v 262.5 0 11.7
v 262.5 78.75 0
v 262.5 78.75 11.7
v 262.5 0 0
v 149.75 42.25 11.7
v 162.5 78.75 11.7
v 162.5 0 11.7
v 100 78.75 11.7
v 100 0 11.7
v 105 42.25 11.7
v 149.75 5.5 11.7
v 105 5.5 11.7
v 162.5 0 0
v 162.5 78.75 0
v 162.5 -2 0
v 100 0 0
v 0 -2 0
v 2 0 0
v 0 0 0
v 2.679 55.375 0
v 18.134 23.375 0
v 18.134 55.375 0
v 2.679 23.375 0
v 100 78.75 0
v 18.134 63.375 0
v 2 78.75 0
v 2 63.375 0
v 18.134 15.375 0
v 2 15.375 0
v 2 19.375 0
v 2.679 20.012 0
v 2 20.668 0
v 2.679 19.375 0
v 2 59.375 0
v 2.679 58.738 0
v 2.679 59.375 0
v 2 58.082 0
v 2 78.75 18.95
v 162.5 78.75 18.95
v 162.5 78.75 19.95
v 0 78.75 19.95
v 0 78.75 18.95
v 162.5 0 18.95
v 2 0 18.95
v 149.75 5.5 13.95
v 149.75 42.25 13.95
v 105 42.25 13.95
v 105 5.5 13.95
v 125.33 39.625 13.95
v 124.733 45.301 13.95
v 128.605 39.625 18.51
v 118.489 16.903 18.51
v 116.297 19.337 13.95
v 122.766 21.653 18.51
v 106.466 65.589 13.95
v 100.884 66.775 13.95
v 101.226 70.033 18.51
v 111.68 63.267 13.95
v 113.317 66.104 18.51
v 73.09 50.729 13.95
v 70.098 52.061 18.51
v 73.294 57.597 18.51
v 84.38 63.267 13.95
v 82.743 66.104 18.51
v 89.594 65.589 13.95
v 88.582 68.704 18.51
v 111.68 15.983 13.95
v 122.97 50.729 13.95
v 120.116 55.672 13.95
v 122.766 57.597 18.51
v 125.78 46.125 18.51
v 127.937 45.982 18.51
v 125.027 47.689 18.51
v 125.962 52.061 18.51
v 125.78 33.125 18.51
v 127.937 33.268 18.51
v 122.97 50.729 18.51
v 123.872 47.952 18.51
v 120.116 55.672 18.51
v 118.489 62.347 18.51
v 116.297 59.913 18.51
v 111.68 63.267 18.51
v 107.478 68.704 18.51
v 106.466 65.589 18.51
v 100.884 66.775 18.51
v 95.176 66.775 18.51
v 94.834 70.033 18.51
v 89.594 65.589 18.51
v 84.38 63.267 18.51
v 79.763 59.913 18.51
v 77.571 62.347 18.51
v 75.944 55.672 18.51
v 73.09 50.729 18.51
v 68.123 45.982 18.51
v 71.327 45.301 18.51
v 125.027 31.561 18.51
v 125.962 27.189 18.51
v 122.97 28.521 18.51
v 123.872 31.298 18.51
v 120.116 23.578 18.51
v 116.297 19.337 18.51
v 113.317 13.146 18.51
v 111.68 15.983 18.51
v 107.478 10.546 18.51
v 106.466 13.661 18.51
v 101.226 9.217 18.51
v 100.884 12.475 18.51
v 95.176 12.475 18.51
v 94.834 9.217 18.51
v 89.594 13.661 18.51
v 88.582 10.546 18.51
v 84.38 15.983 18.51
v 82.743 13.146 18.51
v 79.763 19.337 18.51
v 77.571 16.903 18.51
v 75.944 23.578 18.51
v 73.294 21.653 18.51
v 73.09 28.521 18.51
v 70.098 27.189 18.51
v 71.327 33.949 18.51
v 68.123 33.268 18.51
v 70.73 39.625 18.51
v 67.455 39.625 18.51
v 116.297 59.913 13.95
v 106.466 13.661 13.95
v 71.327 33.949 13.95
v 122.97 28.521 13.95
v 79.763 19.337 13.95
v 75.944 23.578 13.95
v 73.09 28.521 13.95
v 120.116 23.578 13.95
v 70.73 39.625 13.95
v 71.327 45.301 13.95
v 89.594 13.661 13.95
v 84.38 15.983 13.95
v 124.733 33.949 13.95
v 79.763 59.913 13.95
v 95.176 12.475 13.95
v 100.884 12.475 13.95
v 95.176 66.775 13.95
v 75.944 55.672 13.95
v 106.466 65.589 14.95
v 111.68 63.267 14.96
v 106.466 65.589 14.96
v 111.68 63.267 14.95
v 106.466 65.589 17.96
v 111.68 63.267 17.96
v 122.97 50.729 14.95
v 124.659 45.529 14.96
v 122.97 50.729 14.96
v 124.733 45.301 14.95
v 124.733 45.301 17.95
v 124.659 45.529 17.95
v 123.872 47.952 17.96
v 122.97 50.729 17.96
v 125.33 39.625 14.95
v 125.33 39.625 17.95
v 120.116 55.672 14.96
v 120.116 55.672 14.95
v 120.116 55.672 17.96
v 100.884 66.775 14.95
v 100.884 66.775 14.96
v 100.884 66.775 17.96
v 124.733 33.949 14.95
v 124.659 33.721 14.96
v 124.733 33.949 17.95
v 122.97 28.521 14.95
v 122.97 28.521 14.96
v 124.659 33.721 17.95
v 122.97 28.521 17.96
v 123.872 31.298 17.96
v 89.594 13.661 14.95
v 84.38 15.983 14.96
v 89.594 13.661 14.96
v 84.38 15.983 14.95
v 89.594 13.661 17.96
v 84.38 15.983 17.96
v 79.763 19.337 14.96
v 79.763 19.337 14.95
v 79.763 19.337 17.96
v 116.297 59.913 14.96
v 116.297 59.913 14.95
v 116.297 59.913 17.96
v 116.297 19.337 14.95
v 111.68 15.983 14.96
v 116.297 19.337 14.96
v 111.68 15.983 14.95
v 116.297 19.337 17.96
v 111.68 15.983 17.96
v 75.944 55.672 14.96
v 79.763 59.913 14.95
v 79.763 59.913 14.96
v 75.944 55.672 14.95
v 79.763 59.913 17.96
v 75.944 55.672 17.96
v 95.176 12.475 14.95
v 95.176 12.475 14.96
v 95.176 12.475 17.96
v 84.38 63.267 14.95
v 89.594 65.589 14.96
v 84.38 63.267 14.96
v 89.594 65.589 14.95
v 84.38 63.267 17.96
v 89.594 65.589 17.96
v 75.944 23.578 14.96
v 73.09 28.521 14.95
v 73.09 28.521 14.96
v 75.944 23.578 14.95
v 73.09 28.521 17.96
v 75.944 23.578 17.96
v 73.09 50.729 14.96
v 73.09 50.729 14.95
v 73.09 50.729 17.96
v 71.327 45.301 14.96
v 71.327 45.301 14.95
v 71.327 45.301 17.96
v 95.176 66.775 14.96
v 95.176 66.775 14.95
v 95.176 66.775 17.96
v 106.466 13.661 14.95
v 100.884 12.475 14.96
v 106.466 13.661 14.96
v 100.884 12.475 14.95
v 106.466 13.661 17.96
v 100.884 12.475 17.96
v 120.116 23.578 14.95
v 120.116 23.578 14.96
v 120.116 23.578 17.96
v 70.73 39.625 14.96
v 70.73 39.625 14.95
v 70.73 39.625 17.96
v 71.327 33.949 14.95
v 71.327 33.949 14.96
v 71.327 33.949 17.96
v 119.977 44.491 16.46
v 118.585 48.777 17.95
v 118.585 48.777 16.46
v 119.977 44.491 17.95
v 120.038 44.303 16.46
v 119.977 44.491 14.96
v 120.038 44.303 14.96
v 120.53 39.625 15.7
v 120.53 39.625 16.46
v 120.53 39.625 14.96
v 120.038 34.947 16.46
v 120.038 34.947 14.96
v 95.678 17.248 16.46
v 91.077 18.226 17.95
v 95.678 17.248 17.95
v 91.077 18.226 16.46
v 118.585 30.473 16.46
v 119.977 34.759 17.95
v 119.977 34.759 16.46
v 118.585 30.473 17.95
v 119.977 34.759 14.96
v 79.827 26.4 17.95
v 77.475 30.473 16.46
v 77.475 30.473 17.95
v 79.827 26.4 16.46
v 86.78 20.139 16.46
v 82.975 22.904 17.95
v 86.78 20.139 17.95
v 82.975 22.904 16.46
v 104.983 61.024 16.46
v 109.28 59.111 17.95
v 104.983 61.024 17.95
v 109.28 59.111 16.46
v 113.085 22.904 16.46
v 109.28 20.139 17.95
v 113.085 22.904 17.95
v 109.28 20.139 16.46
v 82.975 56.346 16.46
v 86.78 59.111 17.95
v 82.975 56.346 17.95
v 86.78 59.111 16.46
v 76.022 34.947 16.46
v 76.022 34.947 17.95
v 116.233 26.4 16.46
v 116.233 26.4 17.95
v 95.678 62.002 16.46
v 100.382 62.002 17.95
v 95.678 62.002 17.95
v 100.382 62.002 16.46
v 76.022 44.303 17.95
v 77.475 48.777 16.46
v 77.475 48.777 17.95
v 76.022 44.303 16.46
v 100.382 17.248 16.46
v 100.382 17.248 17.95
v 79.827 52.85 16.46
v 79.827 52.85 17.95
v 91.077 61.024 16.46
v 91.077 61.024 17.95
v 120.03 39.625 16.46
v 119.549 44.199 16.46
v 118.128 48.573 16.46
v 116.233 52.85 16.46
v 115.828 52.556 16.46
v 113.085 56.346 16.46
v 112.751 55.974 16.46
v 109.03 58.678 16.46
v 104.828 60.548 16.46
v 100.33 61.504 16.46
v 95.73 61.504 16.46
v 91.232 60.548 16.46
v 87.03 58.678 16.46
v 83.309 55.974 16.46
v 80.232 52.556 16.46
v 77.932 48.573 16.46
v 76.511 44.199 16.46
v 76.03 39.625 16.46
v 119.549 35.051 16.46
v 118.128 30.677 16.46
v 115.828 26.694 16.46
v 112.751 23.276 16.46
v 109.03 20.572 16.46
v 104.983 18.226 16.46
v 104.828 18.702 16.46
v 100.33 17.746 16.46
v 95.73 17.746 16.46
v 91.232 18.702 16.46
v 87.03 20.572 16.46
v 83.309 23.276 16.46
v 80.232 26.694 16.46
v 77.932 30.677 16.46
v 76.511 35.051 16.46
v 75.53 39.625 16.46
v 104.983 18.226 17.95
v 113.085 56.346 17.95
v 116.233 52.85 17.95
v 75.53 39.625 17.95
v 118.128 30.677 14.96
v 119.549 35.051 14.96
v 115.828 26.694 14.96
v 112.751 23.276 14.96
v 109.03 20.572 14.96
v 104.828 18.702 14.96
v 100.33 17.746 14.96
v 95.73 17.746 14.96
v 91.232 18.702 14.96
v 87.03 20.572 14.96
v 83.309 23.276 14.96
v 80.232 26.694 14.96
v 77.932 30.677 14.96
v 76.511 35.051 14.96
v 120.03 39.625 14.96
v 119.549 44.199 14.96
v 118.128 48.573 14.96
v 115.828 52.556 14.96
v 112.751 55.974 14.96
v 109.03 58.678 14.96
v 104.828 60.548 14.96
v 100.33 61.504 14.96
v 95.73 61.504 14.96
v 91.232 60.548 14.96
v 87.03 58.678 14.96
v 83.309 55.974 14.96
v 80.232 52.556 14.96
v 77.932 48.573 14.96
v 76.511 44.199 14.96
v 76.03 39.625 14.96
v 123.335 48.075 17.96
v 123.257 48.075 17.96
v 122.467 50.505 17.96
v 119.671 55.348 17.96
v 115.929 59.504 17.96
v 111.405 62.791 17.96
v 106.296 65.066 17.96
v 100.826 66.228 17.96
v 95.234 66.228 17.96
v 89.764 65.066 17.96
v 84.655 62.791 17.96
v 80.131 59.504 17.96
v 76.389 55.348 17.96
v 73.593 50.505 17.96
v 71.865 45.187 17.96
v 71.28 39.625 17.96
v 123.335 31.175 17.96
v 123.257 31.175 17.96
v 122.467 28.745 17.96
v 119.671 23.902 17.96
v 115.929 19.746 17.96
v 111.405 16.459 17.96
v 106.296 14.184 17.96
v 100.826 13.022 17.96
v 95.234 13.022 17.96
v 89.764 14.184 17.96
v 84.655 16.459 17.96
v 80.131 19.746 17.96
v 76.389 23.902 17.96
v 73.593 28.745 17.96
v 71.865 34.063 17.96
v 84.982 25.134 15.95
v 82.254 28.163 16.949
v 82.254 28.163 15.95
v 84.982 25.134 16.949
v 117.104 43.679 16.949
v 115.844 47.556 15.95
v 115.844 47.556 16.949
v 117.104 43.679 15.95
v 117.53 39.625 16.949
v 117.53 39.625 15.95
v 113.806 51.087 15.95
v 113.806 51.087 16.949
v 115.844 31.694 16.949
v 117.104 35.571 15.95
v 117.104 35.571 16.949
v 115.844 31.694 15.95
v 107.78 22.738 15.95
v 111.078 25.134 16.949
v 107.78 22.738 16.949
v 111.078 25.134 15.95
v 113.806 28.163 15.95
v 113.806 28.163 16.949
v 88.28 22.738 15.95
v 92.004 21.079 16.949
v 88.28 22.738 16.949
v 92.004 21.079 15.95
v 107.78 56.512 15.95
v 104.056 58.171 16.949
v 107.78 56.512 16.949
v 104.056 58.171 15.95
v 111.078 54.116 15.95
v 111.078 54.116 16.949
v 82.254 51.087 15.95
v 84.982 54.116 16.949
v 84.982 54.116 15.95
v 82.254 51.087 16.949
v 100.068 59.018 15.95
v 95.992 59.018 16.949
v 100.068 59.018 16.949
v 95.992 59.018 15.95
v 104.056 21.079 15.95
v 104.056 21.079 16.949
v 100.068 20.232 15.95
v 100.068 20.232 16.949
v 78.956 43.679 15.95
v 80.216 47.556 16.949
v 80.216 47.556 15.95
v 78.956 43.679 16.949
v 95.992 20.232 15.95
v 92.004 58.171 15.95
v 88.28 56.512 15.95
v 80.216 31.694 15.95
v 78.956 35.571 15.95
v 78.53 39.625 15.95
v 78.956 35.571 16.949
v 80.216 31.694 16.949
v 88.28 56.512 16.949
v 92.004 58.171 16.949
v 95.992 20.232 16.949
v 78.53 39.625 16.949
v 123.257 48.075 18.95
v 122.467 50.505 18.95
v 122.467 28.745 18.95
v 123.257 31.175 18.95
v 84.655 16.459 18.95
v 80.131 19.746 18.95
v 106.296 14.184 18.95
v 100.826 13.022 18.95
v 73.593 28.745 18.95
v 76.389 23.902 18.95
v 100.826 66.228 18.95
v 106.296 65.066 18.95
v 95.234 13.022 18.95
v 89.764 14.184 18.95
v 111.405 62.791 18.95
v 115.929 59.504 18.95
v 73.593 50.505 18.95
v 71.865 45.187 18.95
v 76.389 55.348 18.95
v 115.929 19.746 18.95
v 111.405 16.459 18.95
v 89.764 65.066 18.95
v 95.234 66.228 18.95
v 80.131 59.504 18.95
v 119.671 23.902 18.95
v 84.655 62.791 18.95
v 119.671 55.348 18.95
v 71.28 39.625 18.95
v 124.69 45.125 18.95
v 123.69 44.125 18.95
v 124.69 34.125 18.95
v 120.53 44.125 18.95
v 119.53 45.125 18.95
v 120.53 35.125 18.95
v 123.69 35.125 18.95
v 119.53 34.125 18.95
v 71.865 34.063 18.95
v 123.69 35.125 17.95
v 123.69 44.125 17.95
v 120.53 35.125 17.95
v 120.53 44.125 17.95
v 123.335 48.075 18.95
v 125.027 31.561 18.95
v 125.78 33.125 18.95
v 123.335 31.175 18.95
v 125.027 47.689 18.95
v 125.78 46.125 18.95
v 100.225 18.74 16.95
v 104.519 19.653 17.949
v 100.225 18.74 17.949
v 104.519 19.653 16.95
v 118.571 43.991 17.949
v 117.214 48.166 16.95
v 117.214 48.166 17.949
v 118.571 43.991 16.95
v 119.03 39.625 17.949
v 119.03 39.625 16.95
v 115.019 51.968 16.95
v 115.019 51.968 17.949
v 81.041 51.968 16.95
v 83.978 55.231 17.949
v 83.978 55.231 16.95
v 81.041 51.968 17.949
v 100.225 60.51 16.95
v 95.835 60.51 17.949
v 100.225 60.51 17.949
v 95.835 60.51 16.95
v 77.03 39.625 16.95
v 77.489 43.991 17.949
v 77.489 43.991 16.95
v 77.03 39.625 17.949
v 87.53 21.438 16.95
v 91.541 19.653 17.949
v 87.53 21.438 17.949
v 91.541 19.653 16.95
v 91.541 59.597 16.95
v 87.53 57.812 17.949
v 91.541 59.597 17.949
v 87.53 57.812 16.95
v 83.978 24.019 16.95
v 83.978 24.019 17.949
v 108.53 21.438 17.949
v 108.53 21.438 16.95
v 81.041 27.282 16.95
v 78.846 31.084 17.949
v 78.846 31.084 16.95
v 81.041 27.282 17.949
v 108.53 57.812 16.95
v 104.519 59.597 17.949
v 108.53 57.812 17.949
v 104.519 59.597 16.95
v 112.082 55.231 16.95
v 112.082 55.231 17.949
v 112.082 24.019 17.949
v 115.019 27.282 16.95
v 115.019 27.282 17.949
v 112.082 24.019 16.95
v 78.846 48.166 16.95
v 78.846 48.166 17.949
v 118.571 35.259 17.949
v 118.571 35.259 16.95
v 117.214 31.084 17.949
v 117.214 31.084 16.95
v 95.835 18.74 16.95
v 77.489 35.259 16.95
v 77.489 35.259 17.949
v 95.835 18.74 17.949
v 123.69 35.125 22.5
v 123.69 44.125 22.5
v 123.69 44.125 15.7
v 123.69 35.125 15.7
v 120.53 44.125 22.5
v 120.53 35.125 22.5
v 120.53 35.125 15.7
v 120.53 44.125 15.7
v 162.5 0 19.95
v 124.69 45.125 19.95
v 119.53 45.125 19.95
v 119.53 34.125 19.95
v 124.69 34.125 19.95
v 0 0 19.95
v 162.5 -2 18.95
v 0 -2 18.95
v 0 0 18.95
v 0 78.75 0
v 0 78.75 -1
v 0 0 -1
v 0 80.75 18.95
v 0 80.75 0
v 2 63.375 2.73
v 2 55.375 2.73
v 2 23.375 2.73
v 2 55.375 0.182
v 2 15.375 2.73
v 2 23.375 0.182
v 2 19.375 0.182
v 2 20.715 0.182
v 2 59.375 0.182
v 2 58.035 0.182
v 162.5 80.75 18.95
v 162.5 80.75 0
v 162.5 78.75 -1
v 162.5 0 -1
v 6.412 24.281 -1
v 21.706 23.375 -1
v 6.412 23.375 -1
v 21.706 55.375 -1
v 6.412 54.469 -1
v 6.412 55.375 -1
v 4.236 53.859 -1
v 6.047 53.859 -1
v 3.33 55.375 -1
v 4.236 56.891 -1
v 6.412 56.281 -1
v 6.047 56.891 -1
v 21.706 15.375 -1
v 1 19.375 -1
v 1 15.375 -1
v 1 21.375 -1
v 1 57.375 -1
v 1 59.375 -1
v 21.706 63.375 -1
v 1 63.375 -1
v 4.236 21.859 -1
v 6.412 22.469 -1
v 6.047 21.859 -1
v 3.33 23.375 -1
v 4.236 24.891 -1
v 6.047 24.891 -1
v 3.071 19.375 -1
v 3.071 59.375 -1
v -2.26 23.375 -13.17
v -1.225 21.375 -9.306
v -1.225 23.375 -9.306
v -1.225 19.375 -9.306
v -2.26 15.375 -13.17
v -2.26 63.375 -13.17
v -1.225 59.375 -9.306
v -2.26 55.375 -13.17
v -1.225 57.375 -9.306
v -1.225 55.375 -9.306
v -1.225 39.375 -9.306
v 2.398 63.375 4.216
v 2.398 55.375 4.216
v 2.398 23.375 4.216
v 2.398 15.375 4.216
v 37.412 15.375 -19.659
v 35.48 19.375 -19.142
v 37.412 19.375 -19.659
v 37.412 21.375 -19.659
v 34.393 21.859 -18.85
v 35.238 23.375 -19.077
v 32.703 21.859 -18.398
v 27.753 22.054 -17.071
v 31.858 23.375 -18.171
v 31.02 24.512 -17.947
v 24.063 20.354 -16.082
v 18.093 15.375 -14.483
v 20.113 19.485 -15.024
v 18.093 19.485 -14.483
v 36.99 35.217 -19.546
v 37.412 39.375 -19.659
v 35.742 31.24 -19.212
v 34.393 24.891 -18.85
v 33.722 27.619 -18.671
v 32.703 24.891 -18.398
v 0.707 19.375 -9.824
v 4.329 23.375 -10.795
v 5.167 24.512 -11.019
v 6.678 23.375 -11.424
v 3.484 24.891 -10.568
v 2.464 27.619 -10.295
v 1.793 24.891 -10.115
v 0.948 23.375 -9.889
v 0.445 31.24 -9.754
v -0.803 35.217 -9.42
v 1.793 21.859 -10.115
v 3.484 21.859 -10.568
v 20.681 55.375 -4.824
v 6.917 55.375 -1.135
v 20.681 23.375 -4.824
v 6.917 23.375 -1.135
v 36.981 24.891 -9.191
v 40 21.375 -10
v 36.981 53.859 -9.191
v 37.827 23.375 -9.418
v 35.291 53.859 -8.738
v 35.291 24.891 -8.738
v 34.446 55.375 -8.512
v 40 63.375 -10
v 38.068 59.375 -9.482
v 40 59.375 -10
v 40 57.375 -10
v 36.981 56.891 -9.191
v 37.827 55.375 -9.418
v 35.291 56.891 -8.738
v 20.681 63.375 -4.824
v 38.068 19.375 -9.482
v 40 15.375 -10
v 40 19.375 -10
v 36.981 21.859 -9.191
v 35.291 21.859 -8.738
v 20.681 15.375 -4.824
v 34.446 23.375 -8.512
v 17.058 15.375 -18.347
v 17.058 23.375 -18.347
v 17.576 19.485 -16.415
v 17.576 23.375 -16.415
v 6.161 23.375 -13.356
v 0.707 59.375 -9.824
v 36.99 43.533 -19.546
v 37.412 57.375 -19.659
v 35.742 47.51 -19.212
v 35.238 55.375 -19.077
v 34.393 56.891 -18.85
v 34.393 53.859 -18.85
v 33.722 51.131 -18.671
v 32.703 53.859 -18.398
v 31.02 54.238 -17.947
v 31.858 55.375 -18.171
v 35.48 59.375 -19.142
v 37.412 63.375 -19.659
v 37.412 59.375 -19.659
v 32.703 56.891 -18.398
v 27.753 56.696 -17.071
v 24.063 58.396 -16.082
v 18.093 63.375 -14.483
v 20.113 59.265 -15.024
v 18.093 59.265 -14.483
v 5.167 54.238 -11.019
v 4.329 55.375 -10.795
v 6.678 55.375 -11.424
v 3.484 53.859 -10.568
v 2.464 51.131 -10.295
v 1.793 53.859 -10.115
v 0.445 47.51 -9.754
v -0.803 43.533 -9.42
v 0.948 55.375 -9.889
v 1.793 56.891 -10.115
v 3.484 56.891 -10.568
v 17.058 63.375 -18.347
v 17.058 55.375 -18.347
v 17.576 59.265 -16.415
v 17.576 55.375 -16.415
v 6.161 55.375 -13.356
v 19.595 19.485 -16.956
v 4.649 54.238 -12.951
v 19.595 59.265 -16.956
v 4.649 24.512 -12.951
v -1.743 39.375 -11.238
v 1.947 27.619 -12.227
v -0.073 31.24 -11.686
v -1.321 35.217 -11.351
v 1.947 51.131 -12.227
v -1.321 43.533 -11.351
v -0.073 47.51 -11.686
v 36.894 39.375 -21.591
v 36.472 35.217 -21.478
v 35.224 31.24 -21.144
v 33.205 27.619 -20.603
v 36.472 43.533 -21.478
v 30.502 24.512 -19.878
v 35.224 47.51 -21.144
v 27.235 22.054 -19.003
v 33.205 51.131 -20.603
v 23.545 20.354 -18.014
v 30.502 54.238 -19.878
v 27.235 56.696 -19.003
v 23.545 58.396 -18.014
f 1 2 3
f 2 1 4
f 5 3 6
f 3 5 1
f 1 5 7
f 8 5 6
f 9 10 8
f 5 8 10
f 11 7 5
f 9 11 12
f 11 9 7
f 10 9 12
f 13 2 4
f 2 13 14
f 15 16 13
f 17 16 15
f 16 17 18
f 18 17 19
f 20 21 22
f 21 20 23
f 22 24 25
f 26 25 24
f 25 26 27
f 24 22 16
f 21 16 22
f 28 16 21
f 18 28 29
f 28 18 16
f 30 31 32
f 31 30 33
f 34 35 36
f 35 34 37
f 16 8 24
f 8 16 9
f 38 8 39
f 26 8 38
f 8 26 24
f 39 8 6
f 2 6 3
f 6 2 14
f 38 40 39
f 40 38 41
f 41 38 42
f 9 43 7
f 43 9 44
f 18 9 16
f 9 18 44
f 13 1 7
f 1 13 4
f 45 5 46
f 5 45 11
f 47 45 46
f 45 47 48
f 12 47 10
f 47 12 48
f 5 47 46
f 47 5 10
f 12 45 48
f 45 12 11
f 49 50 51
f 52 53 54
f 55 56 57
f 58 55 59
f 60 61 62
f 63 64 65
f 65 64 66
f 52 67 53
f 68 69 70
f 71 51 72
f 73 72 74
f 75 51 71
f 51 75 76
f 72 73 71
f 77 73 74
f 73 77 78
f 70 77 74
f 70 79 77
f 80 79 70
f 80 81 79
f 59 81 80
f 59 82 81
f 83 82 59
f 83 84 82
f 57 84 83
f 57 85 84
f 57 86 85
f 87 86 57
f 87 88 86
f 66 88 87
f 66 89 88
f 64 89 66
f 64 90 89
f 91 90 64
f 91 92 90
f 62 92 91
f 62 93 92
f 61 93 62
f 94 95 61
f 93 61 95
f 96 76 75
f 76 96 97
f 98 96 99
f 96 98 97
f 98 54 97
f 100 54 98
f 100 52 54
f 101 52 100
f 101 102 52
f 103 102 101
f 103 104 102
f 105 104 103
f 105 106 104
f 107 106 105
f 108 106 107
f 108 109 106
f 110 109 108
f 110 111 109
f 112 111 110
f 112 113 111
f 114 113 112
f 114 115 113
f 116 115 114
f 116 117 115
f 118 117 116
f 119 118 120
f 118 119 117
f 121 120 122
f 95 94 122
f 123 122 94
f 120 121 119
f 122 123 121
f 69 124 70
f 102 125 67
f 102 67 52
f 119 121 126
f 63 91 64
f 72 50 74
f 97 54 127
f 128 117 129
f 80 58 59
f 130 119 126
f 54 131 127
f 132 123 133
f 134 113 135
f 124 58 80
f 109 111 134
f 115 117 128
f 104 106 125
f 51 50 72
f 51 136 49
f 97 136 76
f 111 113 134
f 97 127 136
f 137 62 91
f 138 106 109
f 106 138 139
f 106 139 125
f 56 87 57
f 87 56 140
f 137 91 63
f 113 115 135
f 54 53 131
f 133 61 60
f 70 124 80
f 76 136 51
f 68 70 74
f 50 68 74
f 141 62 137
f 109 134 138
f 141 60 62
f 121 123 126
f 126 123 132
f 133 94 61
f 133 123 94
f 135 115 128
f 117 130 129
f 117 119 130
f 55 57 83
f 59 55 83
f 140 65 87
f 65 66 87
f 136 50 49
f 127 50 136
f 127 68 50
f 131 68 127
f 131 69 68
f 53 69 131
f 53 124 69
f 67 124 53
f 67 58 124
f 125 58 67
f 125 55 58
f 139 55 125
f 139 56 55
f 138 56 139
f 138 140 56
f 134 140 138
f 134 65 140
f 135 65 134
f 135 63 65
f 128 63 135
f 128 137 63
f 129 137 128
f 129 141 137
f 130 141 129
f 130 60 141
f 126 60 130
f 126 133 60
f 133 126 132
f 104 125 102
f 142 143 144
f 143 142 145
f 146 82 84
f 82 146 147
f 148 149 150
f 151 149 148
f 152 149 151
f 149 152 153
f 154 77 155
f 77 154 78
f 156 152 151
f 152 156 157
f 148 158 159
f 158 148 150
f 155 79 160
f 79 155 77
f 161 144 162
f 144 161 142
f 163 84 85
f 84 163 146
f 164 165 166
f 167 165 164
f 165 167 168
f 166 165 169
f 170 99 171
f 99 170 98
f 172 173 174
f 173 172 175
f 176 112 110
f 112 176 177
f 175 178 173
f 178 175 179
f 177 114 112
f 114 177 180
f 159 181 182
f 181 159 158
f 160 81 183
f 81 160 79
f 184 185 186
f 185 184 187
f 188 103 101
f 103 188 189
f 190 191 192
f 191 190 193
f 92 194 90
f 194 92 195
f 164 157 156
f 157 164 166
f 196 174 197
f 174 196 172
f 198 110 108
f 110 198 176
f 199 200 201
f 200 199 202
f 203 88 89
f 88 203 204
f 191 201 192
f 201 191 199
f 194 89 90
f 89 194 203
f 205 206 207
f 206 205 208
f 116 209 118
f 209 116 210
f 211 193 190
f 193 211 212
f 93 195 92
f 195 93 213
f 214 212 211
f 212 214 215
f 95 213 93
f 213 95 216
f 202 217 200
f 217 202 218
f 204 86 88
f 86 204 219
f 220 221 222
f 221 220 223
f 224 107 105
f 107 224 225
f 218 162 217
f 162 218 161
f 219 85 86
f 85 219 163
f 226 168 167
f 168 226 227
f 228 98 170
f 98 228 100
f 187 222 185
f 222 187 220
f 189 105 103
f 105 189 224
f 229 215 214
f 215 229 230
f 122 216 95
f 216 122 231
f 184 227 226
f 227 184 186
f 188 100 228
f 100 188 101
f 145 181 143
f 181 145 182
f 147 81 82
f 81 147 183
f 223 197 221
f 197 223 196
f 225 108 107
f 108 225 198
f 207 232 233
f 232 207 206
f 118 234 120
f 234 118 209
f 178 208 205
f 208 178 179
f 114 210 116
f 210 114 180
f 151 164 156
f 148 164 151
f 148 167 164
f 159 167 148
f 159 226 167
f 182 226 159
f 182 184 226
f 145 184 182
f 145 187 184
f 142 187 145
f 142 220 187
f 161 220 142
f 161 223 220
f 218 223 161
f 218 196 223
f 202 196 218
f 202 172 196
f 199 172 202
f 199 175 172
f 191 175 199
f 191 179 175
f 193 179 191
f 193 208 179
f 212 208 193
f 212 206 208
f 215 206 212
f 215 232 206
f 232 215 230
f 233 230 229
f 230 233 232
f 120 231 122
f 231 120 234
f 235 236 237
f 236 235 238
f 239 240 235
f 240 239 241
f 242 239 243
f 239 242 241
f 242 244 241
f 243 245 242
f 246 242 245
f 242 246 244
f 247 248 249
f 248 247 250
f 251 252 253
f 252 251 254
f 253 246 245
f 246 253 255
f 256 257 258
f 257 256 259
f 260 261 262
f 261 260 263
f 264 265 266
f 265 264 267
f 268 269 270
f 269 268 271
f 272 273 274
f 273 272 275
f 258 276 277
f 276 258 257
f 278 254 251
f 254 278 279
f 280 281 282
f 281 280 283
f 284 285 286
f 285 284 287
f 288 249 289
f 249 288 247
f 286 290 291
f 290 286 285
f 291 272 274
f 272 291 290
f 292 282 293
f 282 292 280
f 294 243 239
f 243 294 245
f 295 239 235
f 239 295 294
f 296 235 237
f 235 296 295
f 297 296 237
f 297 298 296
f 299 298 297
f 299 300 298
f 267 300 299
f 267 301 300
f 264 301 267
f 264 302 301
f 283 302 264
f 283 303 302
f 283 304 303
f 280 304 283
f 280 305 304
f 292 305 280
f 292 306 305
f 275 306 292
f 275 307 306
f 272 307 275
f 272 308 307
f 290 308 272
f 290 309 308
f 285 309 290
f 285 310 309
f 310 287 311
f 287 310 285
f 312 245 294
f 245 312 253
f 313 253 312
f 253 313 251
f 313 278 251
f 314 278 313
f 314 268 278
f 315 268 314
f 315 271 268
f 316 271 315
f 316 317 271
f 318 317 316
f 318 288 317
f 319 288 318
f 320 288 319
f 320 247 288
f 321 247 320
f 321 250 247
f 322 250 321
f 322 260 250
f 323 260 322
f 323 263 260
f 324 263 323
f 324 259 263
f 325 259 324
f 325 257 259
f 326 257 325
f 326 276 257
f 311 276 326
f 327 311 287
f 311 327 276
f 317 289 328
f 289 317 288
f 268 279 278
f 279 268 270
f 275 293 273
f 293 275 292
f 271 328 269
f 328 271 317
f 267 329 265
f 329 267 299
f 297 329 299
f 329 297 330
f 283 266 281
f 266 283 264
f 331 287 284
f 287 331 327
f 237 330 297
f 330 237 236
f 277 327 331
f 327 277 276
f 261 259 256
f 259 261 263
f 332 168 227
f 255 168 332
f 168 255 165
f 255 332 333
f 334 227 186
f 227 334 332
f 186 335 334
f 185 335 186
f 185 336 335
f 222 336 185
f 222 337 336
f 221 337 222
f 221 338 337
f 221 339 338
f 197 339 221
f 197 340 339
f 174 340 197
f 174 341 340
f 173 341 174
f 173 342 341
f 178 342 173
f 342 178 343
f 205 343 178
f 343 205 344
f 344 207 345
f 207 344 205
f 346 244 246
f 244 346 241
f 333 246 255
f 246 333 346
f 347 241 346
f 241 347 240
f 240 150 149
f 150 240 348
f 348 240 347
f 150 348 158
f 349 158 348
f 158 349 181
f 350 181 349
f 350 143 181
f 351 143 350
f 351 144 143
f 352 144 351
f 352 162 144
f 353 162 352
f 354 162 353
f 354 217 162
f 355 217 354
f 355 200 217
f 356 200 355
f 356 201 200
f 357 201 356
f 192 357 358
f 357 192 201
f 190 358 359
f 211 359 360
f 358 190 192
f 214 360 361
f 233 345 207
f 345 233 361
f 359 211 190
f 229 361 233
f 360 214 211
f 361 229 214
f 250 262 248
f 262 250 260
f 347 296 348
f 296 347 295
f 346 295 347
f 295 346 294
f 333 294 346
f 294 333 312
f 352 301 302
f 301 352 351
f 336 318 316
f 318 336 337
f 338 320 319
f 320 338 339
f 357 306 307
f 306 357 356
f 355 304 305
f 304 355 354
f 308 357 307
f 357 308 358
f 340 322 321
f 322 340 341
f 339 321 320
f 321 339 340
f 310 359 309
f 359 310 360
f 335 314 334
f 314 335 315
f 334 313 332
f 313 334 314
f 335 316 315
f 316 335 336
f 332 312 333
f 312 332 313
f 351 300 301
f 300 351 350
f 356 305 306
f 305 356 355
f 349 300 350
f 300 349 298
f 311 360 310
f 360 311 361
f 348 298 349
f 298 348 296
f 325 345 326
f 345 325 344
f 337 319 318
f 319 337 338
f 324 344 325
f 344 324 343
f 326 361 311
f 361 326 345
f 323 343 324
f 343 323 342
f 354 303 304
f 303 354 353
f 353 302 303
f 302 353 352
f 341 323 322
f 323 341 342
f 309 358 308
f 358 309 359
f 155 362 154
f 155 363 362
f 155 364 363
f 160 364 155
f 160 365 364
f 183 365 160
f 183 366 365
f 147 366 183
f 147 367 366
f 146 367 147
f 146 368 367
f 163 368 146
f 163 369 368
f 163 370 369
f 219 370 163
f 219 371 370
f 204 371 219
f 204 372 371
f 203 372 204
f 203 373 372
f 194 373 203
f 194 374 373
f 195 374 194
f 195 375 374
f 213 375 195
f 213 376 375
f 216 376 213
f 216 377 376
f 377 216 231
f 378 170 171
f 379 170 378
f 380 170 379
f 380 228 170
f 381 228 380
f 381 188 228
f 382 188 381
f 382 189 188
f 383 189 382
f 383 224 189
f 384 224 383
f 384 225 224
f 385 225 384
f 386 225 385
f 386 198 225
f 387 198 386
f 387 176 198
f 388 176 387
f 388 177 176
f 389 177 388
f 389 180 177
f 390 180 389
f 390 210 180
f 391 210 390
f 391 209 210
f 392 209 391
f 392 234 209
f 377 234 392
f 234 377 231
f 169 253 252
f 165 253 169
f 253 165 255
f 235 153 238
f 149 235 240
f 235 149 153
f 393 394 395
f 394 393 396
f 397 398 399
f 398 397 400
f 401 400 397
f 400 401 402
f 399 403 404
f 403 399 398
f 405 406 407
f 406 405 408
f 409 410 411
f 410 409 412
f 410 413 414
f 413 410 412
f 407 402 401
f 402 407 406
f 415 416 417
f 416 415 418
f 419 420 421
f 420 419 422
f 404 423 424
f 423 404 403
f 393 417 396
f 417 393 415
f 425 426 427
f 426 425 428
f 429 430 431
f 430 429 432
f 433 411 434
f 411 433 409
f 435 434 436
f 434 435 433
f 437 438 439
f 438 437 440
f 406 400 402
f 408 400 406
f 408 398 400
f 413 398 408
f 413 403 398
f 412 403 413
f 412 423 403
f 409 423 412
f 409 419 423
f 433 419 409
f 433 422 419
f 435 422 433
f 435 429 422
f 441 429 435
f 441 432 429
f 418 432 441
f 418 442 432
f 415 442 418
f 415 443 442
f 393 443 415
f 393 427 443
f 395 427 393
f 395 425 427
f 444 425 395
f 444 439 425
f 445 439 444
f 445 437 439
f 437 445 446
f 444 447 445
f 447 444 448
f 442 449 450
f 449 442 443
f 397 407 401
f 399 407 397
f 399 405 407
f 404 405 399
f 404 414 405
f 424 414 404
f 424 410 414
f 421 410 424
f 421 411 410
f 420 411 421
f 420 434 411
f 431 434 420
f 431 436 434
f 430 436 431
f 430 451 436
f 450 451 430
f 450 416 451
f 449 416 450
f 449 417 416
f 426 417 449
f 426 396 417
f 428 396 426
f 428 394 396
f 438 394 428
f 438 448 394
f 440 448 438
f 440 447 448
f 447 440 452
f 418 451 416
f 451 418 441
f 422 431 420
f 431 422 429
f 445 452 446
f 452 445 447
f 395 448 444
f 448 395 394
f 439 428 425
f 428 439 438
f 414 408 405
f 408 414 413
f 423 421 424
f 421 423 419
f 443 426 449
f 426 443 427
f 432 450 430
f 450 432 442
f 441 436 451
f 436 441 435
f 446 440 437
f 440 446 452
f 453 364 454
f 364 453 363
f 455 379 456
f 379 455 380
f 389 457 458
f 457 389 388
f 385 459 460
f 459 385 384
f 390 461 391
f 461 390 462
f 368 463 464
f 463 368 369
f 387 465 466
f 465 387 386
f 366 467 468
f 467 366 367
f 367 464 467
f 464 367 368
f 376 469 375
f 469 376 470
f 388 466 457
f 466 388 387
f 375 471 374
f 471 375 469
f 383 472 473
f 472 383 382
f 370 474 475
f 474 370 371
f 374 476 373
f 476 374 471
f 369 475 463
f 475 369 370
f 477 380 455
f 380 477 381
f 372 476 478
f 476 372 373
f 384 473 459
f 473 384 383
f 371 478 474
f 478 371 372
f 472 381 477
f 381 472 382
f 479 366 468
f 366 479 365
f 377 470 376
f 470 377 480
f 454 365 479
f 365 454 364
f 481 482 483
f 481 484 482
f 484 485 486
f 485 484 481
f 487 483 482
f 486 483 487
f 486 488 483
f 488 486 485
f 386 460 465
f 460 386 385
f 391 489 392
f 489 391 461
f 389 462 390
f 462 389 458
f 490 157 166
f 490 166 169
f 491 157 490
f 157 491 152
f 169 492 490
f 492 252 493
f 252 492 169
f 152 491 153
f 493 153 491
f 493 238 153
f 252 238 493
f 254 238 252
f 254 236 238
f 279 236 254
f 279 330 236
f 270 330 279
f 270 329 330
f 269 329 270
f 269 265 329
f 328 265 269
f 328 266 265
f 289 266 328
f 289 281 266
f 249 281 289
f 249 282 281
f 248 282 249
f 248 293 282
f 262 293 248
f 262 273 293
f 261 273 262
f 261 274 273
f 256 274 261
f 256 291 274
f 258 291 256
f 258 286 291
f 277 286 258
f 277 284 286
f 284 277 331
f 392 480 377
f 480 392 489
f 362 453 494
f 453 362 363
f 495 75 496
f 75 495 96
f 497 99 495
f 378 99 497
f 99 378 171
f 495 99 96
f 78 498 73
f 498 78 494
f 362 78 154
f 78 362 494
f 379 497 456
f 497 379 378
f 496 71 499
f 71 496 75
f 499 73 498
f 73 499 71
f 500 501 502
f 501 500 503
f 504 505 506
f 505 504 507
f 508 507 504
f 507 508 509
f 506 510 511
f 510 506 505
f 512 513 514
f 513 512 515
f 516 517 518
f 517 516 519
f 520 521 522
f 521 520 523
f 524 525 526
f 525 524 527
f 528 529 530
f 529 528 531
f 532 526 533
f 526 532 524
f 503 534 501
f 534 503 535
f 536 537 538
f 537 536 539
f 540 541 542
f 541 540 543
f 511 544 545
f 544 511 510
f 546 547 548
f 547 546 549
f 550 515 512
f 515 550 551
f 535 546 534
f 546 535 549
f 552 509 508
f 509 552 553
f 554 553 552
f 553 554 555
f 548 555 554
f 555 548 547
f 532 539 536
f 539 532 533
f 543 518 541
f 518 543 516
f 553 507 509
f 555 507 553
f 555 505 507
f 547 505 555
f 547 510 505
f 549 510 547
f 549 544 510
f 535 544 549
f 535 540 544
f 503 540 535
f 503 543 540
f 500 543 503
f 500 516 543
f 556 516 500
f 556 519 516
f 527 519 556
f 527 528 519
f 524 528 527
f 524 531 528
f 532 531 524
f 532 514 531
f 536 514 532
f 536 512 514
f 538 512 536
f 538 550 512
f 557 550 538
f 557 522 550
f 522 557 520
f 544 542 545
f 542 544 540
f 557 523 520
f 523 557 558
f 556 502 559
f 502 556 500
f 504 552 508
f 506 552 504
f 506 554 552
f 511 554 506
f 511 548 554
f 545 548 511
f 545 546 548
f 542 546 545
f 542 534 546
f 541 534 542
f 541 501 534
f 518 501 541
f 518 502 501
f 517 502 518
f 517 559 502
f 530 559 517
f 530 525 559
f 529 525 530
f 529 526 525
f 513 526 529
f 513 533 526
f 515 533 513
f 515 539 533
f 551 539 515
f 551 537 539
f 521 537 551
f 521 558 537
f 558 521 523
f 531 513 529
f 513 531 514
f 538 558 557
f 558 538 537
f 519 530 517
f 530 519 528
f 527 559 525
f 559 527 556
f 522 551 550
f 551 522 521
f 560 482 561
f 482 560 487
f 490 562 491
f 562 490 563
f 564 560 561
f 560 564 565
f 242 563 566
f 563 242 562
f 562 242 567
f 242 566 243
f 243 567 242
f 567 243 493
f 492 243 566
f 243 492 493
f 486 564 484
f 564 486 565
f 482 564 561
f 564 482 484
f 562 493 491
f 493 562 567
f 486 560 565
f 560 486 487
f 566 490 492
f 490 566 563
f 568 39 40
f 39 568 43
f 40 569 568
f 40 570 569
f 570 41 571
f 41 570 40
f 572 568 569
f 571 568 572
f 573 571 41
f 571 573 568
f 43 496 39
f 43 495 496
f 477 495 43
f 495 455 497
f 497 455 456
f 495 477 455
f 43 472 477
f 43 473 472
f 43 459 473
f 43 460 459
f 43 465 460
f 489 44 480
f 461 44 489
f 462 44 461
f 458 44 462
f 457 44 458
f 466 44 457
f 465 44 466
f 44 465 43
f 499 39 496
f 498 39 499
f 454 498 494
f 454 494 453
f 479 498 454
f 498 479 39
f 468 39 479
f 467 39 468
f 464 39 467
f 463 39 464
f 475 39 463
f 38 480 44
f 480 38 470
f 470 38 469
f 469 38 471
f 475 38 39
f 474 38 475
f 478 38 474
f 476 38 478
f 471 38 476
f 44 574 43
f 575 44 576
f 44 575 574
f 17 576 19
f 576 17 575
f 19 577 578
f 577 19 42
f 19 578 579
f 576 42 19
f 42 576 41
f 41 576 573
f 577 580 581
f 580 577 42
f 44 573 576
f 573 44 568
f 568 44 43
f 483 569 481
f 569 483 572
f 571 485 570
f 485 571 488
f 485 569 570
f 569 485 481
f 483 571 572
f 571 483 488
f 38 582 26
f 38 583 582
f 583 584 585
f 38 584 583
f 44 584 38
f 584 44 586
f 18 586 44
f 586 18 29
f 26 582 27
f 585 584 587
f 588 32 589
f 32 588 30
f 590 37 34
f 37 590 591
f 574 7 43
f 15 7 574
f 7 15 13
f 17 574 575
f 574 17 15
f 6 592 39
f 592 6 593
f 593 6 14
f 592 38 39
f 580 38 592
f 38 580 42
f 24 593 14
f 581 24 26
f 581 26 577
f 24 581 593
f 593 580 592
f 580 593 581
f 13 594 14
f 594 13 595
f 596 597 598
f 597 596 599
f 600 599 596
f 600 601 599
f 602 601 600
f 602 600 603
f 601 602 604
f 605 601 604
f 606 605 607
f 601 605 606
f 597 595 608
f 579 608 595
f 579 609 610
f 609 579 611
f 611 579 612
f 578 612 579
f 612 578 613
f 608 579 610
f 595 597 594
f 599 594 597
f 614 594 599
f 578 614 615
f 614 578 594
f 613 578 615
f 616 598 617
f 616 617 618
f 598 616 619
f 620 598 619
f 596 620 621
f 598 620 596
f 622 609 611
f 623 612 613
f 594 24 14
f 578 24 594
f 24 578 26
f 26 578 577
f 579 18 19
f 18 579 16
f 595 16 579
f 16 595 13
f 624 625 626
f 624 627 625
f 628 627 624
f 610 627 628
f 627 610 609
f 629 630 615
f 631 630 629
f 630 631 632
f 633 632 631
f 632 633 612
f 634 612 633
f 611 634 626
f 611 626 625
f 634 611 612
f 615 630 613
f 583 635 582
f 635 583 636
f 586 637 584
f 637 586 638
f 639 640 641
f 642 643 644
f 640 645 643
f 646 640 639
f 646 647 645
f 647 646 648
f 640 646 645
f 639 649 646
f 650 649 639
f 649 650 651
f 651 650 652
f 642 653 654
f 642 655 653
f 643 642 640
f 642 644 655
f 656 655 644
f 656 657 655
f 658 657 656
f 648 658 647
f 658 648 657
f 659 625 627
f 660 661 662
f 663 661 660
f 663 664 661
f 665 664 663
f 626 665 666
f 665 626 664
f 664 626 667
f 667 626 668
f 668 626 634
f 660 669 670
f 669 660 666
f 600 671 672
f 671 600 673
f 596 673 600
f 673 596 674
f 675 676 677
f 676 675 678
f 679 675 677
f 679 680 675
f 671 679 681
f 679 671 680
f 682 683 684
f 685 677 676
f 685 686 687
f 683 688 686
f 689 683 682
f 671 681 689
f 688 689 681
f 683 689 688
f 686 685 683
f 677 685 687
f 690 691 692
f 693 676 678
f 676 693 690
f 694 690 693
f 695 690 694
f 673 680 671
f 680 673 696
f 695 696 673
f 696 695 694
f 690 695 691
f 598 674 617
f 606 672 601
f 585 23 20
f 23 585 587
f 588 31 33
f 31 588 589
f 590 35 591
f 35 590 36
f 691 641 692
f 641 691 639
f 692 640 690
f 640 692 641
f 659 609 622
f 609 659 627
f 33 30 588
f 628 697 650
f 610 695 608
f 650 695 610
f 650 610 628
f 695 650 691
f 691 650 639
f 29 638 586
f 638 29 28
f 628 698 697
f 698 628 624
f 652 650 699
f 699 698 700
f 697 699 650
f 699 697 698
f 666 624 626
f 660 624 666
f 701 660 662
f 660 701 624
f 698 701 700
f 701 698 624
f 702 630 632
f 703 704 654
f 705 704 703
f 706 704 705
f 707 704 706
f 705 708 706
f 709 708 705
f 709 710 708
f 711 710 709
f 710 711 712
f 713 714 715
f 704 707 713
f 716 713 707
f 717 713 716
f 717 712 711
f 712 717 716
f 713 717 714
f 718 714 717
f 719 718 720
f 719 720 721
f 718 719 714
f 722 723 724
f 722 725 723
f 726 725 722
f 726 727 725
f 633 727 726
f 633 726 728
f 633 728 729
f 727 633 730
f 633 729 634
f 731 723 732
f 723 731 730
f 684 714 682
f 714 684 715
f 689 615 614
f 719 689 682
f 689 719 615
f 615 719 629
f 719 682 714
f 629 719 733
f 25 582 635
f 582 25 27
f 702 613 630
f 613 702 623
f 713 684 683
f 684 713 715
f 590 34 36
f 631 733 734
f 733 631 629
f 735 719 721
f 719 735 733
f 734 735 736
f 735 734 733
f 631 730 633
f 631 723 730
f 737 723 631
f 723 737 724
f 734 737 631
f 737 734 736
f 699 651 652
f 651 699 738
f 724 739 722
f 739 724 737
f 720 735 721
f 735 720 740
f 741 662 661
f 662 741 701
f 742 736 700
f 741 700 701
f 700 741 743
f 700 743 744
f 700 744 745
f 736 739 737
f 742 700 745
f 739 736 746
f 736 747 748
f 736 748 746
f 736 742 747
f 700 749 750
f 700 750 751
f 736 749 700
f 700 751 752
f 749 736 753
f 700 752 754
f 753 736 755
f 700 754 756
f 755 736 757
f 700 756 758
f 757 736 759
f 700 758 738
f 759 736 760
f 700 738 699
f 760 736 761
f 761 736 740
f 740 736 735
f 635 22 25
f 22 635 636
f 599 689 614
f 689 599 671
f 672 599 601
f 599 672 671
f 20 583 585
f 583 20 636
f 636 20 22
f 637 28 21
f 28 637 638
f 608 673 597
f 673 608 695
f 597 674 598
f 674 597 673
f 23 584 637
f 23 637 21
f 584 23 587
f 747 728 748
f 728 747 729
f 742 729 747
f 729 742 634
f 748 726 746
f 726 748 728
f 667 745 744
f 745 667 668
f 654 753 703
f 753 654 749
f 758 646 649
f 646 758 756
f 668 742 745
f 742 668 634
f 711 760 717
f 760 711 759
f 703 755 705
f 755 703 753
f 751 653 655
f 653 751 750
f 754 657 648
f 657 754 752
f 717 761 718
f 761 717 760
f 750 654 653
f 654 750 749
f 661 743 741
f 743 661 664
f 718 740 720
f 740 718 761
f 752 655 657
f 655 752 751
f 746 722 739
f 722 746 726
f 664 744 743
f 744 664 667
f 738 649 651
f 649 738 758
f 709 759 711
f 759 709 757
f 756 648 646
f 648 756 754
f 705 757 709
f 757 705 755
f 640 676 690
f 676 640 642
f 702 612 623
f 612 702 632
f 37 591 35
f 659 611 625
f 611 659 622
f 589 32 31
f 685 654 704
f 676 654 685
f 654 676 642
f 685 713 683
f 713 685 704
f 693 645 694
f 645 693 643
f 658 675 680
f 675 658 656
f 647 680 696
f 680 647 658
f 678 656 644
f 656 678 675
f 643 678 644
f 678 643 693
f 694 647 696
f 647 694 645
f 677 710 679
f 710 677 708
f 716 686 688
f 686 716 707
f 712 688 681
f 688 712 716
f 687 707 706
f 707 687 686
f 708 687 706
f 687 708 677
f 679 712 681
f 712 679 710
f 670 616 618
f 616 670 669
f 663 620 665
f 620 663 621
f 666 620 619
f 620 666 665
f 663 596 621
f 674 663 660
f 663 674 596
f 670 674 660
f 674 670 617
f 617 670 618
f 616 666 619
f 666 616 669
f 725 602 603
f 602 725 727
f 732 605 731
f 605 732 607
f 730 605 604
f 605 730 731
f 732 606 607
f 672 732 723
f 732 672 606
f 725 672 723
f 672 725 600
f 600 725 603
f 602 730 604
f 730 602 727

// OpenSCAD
caselength=162.5;
module HMD() { // phone with case. rough model for visualization
    color("#666666") cube([caselength, 78.75, 11.7]);
    color("#444444") translate([5, 5.5, 11.7]) cube([44.75,36.75,2.25]);
}

module chargerHolder(ring=true) {
    d2=61.15;
    d1=54.6;
    sideOffset = (9.3+8.8)/2; // snap position avg
    bottomOffset = (34.65+33.14)/2; // snap position avg
    translate([caselength-bottomOffset-d2/2, sideOffset+d2/2, 11.7+2.25]) {
//        cylinder(d2=d2, d1=54.6, h=4.56);
//        cylinder(d=54, h=1);
        difference() {
            cylinder(d2=d2, d1=d1, h=4.56);
            translate([0,0,1]) cylinder(d=d1, h=4.56);
        }
        translate([0,0,1.01]) difference() { // 1.5mm inner ring
            cylinder(h=1.5, d=45);
            translate([0,0,-.1]) cylinder(h=2, d=44);
        }
        if(ring) translate([0,0,1.01]) difference() { // magnet ring
            color("silver") cylinder(d=d1, h=3);
            translate([0,0,-.1]) cylinder(d=45, h=5);
            slice_angle = 25; // asin((11/2)/ (47/2));
            echo(slice_angle=slice_angle);
            rotate([0,0,-slice_angle /2])
            rotate_extrude(angle=slice_angle , convexity=1) { square([d2/2, 5.5]); }
        }
    }
    // 1.5 until ring, ring 3mm deep, outer wall is 1mm thick. likely all walls are 1mm
}

module chargerPCB() {
    sideOffset = (9.3+8.8)/2; // snap position avg
    bottomOffset = (34.65+33.14)/2; // snap position avg
    d2=61.15;
    d1=54.6;
    center_x = caselength-bottomOffset-d2/2;
    center_y = sideOffset+d2/2;
    translate([center_x, center_y, 11.7+2.25+1+1]) {
        difference() {
            color("#ffa267", alpha=0.5) cylinder(d=39, h=.999); // coil
            translate([0,0,-0.01]) cylinder(d=20, h=1.01);
        }
        color("#666666", alpha=1) cylinder(d=20, h=.999); // ferrite center
    }
    translate([center_x, center_y, 11.7+2.25+1+2]) {
        color("#666666", alpha=0.5) cylinder(d=42, h=.999); // ferrite
    }
    color("#666666", alpha=0.5) translate([center_x, center_y, 11.7+2.25+1+3]) {
        cylinder(d=53.5, h=1); // FR4
        translate([53.5/2-3.16-1, -(9+4)/2, 0]) linear_extrude(1) minkowski() {
            square([3.16, 9+4]); // little tab
            circle(2);
        }
    }
    
    translate([center_x+45/2, center_y-9/2, 11.7+1+3]) {
        color("silver") cube([3.16, 9, 6.8]); // USB-c port
    }
}


module chargerBack() {
    sideOffset = (9.3+8.8)/2; // snap position avg
    bottomOffset = (34.65+33.14)/2; // snap position avg
    d2=61.15;
    d1=54.6;
    center_x = caselength-bottomOffset-d2/2;
    center_y = sideOffset+d2/2;
    
    wall_thickness=2;
    color("#aa66ff", alpha=.3) {
        difference() {
            translate([0,0,11.7+5+2.25]) cube([caselength, 78.75, 1]);
            translate([center_x+45/2-1, center_y-11/2, 11.7+4]) cube([5.16, 11, 6.8]);
        }
        translate([0,0,0]) cube([wall_thickness, 78.75, 11.7+2.25+5]);
        translate([0,-wall_thickness,0]) cube([caselength, wall_thickness, 11.7+5+2.25]);
        translate([0,78.75,0]) cube([caselength, wall_thickness, 11.7+5+2.25]);
        
        translate([0,0,-1]) cube([caselength, 78.75, 1]);
    }
}

translate([100-$t*100, 0,
    $t > .80 ? (
        $t > .85
            ? 2.25
            : (2.25 * ($t-.80)/.05))
        : 0])
    HMD();
difference() {
    chargerHolder(ring=true);
    chargerPCB();
}
chargerPCB();
chargerBack();

module fanRails() {
    color("#aa66ff") {
        difference() {
            union() {
                translate([0,-4,0]) cube([40,4,10]);
                translate([20,-4,10]) cube([20,8,4]);
                translate([0,40,0]) cube([40,4,10]);
                translate([20,40-4,10]) cube([20,8,4]);
            }
            translate([20,20,0]) cylinder(d=40, h=12);
        }
        translate([20,40-4,-4]) cube([20,8,4]);
        translate([20,-4,-4]) cube([20,8,4]);
    }
}
translate([40,78.75/2-20,-10]) rotate([180,-15,180]) fanRails();

module fan() {
    color("#333333", alpha=0.5) difference() {
        union() {            
        translate([20,20,0]) cylinder(d=40, h=12);
            hull() {
                translate([0,2,0]) cube([2,36,10]);
                translate([38,2,0]) cube([2,36,10]);
                translate([2,0,0]) cube([36,2,10]);
                translate([2,38,0]) cube([36,2,10]);
            }
        }
        translate([4,4,-1]) cylinder(d=3.5, h=12);
        translate([4,36,-1]) cylinder(d=3.5, h=12);
        translate([36,4,-1]) cylinder(d=3.5, h=12);
        translate([36,36,-1]) cylinder(d=3.5, h=12);
    }
}
translate([40,78.75/2-20,-10]) rotate([180,-15,180]) fan();


//$fn=360;

module magnetHolderTest() { // note - prints fine on "faster prints". clean up ring with acetone before final installation
    d2=61.15;
    d1=54.6;
    difference() {
        cylinder(d2=d2, d1=d1, h=4.56);
        translate([0,0,1]) cylinder(d=d1, h=4.56);
        translate([0,0,-.1]) cylinder(h=2, d=44);
    }
    translate([0,0,1.01]) difference() { // 1.5mm inner ring
        cylinder(h=1.5, d=45);
        translate([0,0,-.1]) cylinder(h=2, d=44);
    }
}
